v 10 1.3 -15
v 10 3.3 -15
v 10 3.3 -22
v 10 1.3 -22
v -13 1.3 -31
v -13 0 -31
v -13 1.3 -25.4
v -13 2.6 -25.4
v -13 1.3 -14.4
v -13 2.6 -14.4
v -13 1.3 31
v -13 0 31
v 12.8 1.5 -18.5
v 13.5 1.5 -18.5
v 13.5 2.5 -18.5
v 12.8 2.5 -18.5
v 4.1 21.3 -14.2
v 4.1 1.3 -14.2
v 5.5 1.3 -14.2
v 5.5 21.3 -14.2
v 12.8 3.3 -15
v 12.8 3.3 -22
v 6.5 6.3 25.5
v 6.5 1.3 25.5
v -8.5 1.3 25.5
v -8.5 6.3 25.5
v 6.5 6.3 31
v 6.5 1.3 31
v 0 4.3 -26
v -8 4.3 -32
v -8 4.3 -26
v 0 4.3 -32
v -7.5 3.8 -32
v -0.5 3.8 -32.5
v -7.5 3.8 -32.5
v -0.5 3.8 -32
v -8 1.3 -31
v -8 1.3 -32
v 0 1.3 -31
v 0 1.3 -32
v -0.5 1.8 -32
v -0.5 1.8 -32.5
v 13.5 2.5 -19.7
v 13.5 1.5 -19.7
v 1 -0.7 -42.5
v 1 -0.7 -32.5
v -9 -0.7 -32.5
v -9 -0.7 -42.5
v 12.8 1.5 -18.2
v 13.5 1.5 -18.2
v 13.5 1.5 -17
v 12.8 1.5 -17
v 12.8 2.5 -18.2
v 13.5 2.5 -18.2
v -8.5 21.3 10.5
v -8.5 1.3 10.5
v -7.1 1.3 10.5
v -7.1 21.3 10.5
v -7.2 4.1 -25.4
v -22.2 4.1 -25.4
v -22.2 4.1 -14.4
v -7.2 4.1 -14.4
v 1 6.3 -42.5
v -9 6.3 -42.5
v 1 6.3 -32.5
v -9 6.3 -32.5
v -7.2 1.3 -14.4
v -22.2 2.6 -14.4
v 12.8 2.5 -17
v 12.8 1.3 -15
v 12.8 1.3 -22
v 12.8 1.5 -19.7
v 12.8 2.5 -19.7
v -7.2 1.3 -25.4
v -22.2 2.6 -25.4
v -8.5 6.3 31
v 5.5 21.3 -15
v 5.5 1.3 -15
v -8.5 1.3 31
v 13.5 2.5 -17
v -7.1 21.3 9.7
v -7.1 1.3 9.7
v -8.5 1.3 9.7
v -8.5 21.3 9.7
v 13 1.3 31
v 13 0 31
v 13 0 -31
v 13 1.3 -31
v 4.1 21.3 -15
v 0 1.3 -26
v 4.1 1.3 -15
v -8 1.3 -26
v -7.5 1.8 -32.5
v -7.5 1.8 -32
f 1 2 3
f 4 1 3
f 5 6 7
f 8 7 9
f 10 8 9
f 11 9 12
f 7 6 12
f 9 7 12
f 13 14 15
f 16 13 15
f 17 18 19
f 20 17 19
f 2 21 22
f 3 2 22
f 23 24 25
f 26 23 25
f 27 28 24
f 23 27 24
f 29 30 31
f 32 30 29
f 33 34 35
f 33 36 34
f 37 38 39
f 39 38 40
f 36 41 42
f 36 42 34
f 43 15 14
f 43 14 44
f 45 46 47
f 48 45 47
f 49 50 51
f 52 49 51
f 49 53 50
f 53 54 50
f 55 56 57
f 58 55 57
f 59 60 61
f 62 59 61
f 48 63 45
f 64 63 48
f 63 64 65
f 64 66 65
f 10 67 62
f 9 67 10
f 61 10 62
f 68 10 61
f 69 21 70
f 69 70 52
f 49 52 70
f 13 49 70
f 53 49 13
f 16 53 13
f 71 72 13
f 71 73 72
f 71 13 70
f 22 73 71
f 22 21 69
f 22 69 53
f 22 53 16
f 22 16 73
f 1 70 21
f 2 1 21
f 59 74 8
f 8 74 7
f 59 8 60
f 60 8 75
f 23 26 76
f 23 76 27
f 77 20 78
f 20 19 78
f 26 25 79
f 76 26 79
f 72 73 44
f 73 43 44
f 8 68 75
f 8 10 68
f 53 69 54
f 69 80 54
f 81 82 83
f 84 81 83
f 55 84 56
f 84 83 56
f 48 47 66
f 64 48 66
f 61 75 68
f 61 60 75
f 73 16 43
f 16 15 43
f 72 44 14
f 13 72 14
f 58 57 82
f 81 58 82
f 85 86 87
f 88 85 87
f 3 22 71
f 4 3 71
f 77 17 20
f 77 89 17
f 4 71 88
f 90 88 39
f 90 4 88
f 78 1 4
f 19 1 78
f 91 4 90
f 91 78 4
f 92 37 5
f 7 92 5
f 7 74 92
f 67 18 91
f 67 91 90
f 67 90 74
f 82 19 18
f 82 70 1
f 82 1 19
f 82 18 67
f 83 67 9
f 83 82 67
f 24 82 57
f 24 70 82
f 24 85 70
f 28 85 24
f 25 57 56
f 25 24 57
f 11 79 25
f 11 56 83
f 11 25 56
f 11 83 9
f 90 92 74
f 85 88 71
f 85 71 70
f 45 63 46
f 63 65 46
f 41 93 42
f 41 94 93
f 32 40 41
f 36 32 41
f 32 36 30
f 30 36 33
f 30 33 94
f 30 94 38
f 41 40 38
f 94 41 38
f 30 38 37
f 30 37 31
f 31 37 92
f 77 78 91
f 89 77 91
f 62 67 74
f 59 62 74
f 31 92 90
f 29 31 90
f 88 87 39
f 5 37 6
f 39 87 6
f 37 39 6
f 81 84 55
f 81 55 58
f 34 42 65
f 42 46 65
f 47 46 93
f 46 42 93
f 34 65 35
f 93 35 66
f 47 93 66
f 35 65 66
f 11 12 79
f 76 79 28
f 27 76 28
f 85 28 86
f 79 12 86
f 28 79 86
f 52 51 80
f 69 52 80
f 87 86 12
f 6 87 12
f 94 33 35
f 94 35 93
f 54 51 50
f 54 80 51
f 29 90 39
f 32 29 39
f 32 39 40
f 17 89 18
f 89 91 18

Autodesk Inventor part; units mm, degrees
ref_plane "YZ Plane" through (0, 0, 0) normal (1, 0, 0) x (0, 1, 0)
ref_plane "XZ Plane" through (0, 0, 0) normal (0, 1, 0) x (-1, 0, 0)
ref_plane "XY Plane" through (0, 0, 0) normal (0, 0, 1) x (1, 0, 0)
sketch "Sketch1" plane through (0, 0, 0) normal (0, 1, 0) x (-1, 0, 0)
  line L0 (-13, -31) -> (13, -31)
  line L1 (13, -31) -> (13, 31)
  line L2 (13, 31) -> (-13, 31)
  line L3 (-13, 31) -> (-13, -31)
  line L4 (-13, -31) -> (13, 31) construction
  line L5 (13, -31) -> (-13, 31) construction
  point P0 (0, 0)
  dimension "d0" = 26
  dimension "d1" = 62
extrude "Extrusion1" add sketch "Sketch1" along normal blind 1.3
sketch "Sketch2" plane through (0, 1.3, 0) normal (0, 1, 0) x (1, 0, 0)
  line L0 (-8, 26) -> (0, 26)
  line L1 (0, 26) -> (0, 32)
  line L2 (0, 32) -> (-8, 32)
  line L3 (-8, 32) -> (-8, 26)
  line L4 (13, 31) -> (-13, 31) projected
  line L5 (-13, 31) -> (-13, -31) projected
  point P0 (0, 0)
  dimension "d4" = 8
  dimension "d5" = 6
  dimension "d6" = 1
  dimension "d7" = 5
extrude "Extrusion2" add sketch "Sketch2" along normal blind 3
sketch "Sketch3" plane through (-13, 0, -31) normal (-1, 0, 0) x (0, 0, 1)
  line L0 (16.6, 2.6) -> (5.6, 2.6)
  line L1 (5.6, 2.6) -> (5.6, 4.1)
  line L2 (5.6, 4.1) -> (16.6, 4.1)
  line L3 (16.6, 4.1) -> (16.6, 2.6)
  line L4 (0, 0) -> (62, 0) projected
  line L5 (0, 0) -> (0, 1.3) projected
  point P0 (31, 0)
  dimension "d10" = 11
  dimension "d11" = 1.5
  dimension "d12" = 2.6
  dimension "d13" = 5.6
extrude "Extrusion3" add sketch "Sketch3" along normal blind 9.2 and the other way blind 5.8
sketch "Sketch4" plane through (0, 1.3, 0) normal (0, 1, 0) x (1, 0, 0)
  line L0 (-13, 31) -> (-13, -31) projected
  line L1 (-7.2, 25.4) -> (-22.2, 25.4) projected
  line L2 (-7.2, 14.4) -> (-22.2, 14.4) projected
  line L3 (-7.2, 25.4) -> (-13, 25.4)
  line L4 (-13, 25.4) -> (-13, 14.4)
  line L5 (-13, 14.4) -> (-7.2, 14.4)
  line L6 (-7.2, 14.4) -> (-7.2, 25.4)
  point P0 (0, 0)
  point P1 (-13, 25.4)
extrude "Extrusion4" add sketch "Sketch4" along normal up to surface (2.8 mm away)
sketch "Sketch5" plane through (13, 0, 31) normal (1, 0, 0) x (0, 0, -1)
  line L0 (46, 3.3) -> (53, 3.3)
  line L1 (53, 3.3) -> (53, 1.3)
  line L2 (53, 1.3) -> (46, 1.3)
  line L3 (46, 1.3) -> (46, 3.3)
  line L4 (0, 1.3) -> (62, 1.3) projected
  line L5 (62, 0) -> (62, 1.3) projected
  point P0 (31, 0)
  dimension "d20" = 16
  dimension "d21" = 7
  dimension "d22" = 2
extrude "Extrusion5" add sketch "Sketch5" against normal blind 3
sketch "Sketch6" plane through (13, 0, 31) normal (1, 0, 0) x (0, 0, -1)
  line L0 (48, 2.5) -> (49.2, 2.5)
  line L1 (49.2, 2.5) -> (49.2, 1.5)
  line L2 (49.2, 1.5) -> (48, 1.5)
  line L3 (48, 1.5) -> (48, 2.5)
  line L4 (62, 0) -> (62, 1.3) projected
  line L5 (0, 0) -> (62, 0) projected
  point P0 (31, 0)
  dimension "d25" = 1.2
  dimension "d26" = 1
  dimension "d27" = 14
  dimension "d28" = 2.5
extrude "Extrusion6" add sketch "Sketch6" along normal blind 0.5
pattern_linear "Rectangular Pattern1" count 2 spacing 1.5 along (0, 0, -1) of "Extrusion6"
sketch "Sketch7" plane through (0, 1.3, -32) normal (0, 0, -1) x (-1, 0, 0)
  line L0 (0, 0) -> (8, 0) projected
  line L1 (8, 0) -> (8, 3) projected
  line L2 (0, 3) -> (8, 3) projected
  line L3 (0, 0) -> (0, 3) projected
  line L4 (7.5, 2.5) -> (7.5, 0.5)
  line L5 (7.5, 0.5) -> (0.5, 0.5)
  line L6 (0.5, 0.5) -> (0.5, 2.5)
  line L7 (0.5, 2.5) -> (7.5, 2.5)
  point P0 (0, -1.3)
  dimension "d34" = 0.5
extrude "Extrusion7" add sketch "Sketch7" along normal blind 0.5 contours L4 L5 L6 L7
sketch "Sketch8" plane through (0, 1.3, -32.5) normal (0, 0, -1) x (-1, 0, 0)
  line L0 (7.5, 2.5) -> (0.5, 2.5) projected
  line L1 (0.5, 2.5) -> (0.5, 0.5) projected
  line L2 (0.5, 0.5) -> (7.5, 0.5) projected
  line L3 (7.5, 0.5) -> (7.5, 2.5) projected
  line L4 (9, 5) -> (-1, 5)
  line L5 (-1, 5) -> (-1, -2)
  line L6 (-1, -2) -> (9, -2)
  line L7 (9, -2) -> (9, 5)
  line L8 (9, 5) -> (-1, -2) construction
  line L9 (-1, 5) -> (9, -2) construction
  point P0 (0, -1.3)
  point P1 (4, 1.5)
  dimension "d37" = 10
  dimension "d38" = 7
extrude "Extrusion8" add sketch "Sketch8" along normal blind 10 contours L3 L2 L1 L0 | L7 L6 L5 L4
sketch "Sketch9" plane through (0, 1.3, 0) normal (0, 1, 0) x (1, 0, 0)
  line L0 (-13, -31) -> (13, -31) projected
  line L1 (-8.5, -31) -> (6.5, -31)
  line L2 (6.5, -31) -> (6.5, -25.5)
  line L3 (6.5, -25.5) -> (-8.5, -25.5)
  line L4 (-8.5, -25.5) -> (-8.5, -31)
  line L5 (-13, 14.4) -> (-13, -31) projected
  point P0 (0, 0)
  dimension "d41" = 15
  dimension "d42" = 5.5
  dimension "d43" = 4.5
extrude "Extrusion9" add sketch "Sketch9" along normal blind 5
sketch "Sketch10" plane through (0, 1.3, 0) normal (0, 1, 0) x (1, 0, 0)
  line L0 (-8.5, -10.5) -> (-7.1, -10.5)
  line L1 (-7.1, -10.5) -> (-7.1, -9.7)
  line L2 (-7.1, -9.7) -> (-8.5, -9.7)
  line L3 (-8.5, -9.7) -> (-8.5, -10.5)
  line L4 (-13, 14.4) -> (-13, -31) projected
  line L5 (-13, -31) -> (-8.5, -31) projected
  line L6 (5.5, 15) -> (4.1, 15)
  line L7 (4.1, 15) -> (4.1, 14.2)
  line L8 (4.1, 14.2) -> (5.5, 14.2)
  line L9 (5.5, 14.2) -> (5.5, 15)
  line L10 (13, -31) -> (13, 15) projected
  line L11 (13, 31) -> (0, 31) projected
  point P0 (0, 0)
  dimension "d46" = 4.5
  dimension "d47" = 20.5
  dimension "d48" = 0.8
  dimension "d49" = 1.4
  dimension "d50" = 7.5
  dimension "d51" = 16
  dimension "d52" = 0.8
  dimension "d53" = 1.4
extrude "Extrusion10" add sketch "Sketch10" along normal blind 20
sketch "Sketch11" plane through (13, 0, 31) normal (1, 0, 0) x (0, 0, -1)
  line L0 (49.5, 2.5) -> (50.7, 2.5) projected
  line L1 (50.7, 2.5) -> (50.7, 1.5) projected
  line L2 (50.7, 1.5) -> (49.5, 1.5) projected
  line L3 (49.5, 1.5) -> (49.5, 2.5) projected
  line L4 (48, 2.5) -> (49.2, 2.5) projected
  line L5 (49.2, 2.5) -> (49.2, 1.5) projected
  line L6 (49.2, 1.5) -> (48, 1.5) projected
  line L7 (48, 1.5) -> (48, 2.5) projected
  line L8 (0, 0) -> (62, 0) projected
  line L9 (62, 0) -> (62, 1.3) projected
  line L10 (53, 1.3) -> (62, 1.3) projected
  line L11 (53, 1.3) -> (53, 3.3) projected
  line L12 (53, 3.3) -> (46, 3.3) projected
  line L13 (46, 3.3) -> (46, 1.3) projected
  line L14 (0, 1.3) -> (46, 1.3) projected
  line L15 (0, 0) -> (0, 1.3) projected
  line L16 (46, 1.3) -> (53, 1.3) projected
  line L17 (46, 1.3) -> (53, 1.3)
  point P0 (31, 0)
extrude "Extrusion11" cut sketch "Sketch11" against normal blind 0.2 contours L13 L12 L11 L16
equation "\"d52\" = d48"
equation "\"d53\" = d49"
properties part number "esp32_t8"
